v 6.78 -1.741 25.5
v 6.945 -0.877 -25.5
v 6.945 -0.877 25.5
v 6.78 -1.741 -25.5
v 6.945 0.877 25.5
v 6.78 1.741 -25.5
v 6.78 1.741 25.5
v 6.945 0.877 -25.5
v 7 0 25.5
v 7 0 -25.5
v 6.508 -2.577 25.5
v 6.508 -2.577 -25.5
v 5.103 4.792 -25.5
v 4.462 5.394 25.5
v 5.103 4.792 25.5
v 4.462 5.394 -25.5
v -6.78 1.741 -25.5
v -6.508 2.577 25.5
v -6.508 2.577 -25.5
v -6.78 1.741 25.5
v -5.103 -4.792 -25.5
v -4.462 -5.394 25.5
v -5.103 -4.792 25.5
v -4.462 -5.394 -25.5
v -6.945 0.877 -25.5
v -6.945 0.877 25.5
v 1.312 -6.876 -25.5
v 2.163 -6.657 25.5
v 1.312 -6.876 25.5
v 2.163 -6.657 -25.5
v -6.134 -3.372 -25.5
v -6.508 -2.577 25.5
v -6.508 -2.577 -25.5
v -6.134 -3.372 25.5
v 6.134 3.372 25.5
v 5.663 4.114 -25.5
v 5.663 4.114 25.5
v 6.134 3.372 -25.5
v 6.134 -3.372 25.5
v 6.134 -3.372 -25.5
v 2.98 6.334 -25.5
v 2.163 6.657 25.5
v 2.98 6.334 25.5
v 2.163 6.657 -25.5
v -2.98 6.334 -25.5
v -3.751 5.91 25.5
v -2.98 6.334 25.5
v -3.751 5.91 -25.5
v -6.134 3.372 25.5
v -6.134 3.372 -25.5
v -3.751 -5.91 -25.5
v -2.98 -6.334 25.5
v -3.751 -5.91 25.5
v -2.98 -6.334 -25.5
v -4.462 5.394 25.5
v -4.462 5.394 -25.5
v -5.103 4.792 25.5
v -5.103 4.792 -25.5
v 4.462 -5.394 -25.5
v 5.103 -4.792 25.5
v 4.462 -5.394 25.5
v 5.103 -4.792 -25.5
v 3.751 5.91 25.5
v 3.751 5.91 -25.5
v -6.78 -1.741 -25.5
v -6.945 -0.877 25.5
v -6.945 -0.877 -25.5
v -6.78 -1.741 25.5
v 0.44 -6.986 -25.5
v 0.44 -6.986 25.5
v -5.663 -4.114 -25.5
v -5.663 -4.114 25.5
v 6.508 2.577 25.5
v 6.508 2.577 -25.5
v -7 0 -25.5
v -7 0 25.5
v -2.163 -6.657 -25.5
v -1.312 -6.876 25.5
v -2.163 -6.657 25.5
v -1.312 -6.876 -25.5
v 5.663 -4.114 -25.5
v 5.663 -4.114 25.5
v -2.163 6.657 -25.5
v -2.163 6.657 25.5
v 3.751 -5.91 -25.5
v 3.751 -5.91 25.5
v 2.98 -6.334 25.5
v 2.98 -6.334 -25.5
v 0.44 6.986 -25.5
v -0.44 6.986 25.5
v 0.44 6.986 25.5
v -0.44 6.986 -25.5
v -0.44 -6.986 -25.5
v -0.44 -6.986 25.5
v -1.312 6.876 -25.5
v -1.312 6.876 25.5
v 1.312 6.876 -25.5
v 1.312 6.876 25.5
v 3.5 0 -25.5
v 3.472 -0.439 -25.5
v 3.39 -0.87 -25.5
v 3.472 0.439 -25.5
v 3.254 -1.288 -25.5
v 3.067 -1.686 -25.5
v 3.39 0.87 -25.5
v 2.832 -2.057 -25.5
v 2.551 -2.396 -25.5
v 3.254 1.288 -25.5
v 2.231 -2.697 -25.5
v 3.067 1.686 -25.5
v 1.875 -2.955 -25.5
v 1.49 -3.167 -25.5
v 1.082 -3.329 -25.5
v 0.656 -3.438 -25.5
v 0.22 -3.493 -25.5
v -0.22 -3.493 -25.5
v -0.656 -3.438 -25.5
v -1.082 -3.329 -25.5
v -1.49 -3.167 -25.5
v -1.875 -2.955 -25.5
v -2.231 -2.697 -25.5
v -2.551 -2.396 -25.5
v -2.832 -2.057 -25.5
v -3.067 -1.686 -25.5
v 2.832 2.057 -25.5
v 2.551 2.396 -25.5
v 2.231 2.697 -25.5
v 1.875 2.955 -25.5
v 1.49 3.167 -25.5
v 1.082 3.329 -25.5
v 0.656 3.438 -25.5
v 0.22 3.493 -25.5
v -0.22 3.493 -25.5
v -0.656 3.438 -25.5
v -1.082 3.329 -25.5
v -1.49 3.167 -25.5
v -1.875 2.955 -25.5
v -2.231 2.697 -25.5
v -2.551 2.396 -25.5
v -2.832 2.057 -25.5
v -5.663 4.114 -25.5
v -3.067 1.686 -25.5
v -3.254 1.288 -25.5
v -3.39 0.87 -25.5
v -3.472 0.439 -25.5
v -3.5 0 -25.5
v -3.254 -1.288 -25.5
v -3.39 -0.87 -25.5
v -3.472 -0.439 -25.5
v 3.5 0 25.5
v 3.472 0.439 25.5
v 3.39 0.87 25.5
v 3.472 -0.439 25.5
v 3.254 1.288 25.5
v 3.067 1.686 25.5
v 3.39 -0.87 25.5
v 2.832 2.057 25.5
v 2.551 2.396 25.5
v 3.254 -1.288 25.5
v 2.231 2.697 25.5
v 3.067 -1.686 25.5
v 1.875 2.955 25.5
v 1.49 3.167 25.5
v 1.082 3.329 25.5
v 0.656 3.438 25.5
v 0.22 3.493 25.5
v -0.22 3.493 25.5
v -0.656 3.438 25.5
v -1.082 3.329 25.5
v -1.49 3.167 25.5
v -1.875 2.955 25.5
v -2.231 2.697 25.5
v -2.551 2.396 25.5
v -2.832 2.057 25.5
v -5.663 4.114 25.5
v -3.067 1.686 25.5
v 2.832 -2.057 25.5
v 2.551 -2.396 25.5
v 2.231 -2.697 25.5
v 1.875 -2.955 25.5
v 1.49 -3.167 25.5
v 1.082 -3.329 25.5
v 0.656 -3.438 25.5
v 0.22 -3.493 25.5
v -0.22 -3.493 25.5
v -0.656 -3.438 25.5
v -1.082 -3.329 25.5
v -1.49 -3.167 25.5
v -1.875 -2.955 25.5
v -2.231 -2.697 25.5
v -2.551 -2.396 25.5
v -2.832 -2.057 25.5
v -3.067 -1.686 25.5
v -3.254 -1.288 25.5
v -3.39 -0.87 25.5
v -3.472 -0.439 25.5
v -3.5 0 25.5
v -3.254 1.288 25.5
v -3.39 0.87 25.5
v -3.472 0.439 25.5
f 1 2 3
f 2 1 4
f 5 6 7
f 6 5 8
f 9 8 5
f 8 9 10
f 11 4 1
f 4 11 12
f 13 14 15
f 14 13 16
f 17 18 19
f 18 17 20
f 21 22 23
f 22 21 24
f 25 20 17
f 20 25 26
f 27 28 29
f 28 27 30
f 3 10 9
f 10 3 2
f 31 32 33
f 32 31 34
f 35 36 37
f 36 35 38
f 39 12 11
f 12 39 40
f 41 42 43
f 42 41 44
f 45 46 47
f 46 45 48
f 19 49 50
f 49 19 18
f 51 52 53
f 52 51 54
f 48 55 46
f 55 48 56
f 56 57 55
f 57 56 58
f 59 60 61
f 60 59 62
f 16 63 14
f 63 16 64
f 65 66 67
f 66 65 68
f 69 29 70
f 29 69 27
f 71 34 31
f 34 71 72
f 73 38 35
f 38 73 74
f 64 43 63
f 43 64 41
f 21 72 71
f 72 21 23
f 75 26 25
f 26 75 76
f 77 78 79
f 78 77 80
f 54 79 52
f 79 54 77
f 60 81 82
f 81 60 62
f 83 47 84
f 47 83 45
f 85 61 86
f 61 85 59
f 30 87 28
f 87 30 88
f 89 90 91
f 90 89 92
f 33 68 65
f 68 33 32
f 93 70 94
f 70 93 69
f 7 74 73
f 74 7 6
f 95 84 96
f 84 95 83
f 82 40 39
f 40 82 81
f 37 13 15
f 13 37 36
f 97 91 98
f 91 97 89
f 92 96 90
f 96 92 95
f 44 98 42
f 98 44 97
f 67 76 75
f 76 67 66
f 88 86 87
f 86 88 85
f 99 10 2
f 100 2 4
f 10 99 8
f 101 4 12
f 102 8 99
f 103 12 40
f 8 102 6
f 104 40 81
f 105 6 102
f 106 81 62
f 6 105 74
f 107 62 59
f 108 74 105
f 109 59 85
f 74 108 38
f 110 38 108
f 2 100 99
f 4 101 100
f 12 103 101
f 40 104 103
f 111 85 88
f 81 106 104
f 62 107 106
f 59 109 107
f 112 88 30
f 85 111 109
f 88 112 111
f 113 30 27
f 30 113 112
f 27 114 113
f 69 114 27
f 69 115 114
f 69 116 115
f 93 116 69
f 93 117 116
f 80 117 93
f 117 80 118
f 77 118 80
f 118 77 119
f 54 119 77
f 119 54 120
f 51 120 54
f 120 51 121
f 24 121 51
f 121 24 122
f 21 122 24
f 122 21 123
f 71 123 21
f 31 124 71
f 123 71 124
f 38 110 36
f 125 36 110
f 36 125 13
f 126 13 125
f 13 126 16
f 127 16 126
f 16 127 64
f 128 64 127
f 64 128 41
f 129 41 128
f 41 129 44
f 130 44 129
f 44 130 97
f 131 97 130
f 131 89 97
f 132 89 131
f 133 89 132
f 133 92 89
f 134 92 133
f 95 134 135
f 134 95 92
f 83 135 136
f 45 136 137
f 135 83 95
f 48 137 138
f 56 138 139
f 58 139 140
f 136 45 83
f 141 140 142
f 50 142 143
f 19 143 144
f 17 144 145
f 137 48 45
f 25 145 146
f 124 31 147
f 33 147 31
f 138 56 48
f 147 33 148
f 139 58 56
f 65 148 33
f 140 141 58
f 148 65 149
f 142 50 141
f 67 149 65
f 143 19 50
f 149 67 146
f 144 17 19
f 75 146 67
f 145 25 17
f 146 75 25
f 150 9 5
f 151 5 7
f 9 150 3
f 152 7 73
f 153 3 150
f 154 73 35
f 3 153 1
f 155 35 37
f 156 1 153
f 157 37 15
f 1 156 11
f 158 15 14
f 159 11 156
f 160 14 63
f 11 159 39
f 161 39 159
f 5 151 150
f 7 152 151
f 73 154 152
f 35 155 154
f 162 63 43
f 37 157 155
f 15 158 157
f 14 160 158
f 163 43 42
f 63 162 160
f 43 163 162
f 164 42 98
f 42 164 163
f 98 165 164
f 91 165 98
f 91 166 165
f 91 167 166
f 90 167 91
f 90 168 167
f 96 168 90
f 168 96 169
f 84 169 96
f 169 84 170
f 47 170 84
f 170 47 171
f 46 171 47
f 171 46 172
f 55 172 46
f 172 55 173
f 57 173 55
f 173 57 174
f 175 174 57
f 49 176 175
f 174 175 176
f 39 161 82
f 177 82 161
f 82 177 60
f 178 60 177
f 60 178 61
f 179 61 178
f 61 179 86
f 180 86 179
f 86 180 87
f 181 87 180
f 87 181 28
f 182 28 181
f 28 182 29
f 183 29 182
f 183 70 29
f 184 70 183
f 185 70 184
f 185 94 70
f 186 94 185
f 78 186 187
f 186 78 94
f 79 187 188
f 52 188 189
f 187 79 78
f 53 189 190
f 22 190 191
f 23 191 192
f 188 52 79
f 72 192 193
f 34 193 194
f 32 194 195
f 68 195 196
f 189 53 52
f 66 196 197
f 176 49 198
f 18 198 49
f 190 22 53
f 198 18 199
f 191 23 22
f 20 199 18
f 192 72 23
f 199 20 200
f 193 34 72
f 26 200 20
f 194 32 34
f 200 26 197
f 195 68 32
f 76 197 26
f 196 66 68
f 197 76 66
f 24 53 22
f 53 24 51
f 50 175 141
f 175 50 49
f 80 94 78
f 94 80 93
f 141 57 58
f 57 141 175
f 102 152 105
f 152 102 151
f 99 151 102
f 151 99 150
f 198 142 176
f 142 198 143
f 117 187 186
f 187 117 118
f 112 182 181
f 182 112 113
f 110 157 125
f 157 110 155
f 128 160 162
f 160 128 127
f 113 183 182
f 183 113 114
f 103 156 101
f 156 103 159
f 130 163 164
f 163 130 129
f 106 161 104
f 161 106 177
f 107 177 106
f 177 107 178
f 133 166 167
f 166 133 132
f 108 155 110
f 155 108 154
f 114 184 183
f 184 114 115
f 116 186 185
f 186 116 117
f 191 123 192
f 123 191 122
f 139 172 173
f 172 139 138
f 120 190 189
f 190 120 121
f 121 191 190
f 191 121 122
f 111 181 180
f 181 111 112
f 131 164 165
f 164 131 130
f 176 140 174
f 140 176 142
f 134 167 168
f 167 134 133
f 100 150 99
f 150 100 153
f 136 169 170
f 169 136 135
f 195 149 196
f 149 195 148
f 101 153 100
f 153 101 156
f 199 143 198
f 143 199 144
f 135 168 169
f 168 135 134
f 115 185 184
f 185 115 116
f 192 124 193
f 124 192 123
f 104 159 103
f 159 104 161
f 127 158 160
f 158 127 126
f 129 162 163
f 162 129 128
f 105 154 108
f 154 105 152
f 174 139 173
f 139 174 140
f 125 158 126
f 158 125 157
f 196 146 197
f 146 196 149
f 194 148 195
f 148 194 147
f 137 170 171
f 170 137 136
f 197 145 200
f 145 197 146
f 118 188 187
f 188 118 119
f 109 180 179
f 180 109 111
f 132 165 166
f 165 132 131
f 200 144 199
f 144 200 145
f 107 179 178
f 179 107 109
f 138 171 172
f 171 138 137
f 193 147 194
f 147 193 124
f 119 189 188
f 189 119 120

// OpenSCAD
$fn = 50;


difference() {
	union() {
		translate(v = [0, 0, -25.5000000000]) {
			cylinder(h = 51, r = 7.0000000000);
		}
	}
	union() {
		translate(v = [0, 0, -100.0000000000]) {
			cylinder(h = 200, r = 3.5000000000);
		}
	}
}
